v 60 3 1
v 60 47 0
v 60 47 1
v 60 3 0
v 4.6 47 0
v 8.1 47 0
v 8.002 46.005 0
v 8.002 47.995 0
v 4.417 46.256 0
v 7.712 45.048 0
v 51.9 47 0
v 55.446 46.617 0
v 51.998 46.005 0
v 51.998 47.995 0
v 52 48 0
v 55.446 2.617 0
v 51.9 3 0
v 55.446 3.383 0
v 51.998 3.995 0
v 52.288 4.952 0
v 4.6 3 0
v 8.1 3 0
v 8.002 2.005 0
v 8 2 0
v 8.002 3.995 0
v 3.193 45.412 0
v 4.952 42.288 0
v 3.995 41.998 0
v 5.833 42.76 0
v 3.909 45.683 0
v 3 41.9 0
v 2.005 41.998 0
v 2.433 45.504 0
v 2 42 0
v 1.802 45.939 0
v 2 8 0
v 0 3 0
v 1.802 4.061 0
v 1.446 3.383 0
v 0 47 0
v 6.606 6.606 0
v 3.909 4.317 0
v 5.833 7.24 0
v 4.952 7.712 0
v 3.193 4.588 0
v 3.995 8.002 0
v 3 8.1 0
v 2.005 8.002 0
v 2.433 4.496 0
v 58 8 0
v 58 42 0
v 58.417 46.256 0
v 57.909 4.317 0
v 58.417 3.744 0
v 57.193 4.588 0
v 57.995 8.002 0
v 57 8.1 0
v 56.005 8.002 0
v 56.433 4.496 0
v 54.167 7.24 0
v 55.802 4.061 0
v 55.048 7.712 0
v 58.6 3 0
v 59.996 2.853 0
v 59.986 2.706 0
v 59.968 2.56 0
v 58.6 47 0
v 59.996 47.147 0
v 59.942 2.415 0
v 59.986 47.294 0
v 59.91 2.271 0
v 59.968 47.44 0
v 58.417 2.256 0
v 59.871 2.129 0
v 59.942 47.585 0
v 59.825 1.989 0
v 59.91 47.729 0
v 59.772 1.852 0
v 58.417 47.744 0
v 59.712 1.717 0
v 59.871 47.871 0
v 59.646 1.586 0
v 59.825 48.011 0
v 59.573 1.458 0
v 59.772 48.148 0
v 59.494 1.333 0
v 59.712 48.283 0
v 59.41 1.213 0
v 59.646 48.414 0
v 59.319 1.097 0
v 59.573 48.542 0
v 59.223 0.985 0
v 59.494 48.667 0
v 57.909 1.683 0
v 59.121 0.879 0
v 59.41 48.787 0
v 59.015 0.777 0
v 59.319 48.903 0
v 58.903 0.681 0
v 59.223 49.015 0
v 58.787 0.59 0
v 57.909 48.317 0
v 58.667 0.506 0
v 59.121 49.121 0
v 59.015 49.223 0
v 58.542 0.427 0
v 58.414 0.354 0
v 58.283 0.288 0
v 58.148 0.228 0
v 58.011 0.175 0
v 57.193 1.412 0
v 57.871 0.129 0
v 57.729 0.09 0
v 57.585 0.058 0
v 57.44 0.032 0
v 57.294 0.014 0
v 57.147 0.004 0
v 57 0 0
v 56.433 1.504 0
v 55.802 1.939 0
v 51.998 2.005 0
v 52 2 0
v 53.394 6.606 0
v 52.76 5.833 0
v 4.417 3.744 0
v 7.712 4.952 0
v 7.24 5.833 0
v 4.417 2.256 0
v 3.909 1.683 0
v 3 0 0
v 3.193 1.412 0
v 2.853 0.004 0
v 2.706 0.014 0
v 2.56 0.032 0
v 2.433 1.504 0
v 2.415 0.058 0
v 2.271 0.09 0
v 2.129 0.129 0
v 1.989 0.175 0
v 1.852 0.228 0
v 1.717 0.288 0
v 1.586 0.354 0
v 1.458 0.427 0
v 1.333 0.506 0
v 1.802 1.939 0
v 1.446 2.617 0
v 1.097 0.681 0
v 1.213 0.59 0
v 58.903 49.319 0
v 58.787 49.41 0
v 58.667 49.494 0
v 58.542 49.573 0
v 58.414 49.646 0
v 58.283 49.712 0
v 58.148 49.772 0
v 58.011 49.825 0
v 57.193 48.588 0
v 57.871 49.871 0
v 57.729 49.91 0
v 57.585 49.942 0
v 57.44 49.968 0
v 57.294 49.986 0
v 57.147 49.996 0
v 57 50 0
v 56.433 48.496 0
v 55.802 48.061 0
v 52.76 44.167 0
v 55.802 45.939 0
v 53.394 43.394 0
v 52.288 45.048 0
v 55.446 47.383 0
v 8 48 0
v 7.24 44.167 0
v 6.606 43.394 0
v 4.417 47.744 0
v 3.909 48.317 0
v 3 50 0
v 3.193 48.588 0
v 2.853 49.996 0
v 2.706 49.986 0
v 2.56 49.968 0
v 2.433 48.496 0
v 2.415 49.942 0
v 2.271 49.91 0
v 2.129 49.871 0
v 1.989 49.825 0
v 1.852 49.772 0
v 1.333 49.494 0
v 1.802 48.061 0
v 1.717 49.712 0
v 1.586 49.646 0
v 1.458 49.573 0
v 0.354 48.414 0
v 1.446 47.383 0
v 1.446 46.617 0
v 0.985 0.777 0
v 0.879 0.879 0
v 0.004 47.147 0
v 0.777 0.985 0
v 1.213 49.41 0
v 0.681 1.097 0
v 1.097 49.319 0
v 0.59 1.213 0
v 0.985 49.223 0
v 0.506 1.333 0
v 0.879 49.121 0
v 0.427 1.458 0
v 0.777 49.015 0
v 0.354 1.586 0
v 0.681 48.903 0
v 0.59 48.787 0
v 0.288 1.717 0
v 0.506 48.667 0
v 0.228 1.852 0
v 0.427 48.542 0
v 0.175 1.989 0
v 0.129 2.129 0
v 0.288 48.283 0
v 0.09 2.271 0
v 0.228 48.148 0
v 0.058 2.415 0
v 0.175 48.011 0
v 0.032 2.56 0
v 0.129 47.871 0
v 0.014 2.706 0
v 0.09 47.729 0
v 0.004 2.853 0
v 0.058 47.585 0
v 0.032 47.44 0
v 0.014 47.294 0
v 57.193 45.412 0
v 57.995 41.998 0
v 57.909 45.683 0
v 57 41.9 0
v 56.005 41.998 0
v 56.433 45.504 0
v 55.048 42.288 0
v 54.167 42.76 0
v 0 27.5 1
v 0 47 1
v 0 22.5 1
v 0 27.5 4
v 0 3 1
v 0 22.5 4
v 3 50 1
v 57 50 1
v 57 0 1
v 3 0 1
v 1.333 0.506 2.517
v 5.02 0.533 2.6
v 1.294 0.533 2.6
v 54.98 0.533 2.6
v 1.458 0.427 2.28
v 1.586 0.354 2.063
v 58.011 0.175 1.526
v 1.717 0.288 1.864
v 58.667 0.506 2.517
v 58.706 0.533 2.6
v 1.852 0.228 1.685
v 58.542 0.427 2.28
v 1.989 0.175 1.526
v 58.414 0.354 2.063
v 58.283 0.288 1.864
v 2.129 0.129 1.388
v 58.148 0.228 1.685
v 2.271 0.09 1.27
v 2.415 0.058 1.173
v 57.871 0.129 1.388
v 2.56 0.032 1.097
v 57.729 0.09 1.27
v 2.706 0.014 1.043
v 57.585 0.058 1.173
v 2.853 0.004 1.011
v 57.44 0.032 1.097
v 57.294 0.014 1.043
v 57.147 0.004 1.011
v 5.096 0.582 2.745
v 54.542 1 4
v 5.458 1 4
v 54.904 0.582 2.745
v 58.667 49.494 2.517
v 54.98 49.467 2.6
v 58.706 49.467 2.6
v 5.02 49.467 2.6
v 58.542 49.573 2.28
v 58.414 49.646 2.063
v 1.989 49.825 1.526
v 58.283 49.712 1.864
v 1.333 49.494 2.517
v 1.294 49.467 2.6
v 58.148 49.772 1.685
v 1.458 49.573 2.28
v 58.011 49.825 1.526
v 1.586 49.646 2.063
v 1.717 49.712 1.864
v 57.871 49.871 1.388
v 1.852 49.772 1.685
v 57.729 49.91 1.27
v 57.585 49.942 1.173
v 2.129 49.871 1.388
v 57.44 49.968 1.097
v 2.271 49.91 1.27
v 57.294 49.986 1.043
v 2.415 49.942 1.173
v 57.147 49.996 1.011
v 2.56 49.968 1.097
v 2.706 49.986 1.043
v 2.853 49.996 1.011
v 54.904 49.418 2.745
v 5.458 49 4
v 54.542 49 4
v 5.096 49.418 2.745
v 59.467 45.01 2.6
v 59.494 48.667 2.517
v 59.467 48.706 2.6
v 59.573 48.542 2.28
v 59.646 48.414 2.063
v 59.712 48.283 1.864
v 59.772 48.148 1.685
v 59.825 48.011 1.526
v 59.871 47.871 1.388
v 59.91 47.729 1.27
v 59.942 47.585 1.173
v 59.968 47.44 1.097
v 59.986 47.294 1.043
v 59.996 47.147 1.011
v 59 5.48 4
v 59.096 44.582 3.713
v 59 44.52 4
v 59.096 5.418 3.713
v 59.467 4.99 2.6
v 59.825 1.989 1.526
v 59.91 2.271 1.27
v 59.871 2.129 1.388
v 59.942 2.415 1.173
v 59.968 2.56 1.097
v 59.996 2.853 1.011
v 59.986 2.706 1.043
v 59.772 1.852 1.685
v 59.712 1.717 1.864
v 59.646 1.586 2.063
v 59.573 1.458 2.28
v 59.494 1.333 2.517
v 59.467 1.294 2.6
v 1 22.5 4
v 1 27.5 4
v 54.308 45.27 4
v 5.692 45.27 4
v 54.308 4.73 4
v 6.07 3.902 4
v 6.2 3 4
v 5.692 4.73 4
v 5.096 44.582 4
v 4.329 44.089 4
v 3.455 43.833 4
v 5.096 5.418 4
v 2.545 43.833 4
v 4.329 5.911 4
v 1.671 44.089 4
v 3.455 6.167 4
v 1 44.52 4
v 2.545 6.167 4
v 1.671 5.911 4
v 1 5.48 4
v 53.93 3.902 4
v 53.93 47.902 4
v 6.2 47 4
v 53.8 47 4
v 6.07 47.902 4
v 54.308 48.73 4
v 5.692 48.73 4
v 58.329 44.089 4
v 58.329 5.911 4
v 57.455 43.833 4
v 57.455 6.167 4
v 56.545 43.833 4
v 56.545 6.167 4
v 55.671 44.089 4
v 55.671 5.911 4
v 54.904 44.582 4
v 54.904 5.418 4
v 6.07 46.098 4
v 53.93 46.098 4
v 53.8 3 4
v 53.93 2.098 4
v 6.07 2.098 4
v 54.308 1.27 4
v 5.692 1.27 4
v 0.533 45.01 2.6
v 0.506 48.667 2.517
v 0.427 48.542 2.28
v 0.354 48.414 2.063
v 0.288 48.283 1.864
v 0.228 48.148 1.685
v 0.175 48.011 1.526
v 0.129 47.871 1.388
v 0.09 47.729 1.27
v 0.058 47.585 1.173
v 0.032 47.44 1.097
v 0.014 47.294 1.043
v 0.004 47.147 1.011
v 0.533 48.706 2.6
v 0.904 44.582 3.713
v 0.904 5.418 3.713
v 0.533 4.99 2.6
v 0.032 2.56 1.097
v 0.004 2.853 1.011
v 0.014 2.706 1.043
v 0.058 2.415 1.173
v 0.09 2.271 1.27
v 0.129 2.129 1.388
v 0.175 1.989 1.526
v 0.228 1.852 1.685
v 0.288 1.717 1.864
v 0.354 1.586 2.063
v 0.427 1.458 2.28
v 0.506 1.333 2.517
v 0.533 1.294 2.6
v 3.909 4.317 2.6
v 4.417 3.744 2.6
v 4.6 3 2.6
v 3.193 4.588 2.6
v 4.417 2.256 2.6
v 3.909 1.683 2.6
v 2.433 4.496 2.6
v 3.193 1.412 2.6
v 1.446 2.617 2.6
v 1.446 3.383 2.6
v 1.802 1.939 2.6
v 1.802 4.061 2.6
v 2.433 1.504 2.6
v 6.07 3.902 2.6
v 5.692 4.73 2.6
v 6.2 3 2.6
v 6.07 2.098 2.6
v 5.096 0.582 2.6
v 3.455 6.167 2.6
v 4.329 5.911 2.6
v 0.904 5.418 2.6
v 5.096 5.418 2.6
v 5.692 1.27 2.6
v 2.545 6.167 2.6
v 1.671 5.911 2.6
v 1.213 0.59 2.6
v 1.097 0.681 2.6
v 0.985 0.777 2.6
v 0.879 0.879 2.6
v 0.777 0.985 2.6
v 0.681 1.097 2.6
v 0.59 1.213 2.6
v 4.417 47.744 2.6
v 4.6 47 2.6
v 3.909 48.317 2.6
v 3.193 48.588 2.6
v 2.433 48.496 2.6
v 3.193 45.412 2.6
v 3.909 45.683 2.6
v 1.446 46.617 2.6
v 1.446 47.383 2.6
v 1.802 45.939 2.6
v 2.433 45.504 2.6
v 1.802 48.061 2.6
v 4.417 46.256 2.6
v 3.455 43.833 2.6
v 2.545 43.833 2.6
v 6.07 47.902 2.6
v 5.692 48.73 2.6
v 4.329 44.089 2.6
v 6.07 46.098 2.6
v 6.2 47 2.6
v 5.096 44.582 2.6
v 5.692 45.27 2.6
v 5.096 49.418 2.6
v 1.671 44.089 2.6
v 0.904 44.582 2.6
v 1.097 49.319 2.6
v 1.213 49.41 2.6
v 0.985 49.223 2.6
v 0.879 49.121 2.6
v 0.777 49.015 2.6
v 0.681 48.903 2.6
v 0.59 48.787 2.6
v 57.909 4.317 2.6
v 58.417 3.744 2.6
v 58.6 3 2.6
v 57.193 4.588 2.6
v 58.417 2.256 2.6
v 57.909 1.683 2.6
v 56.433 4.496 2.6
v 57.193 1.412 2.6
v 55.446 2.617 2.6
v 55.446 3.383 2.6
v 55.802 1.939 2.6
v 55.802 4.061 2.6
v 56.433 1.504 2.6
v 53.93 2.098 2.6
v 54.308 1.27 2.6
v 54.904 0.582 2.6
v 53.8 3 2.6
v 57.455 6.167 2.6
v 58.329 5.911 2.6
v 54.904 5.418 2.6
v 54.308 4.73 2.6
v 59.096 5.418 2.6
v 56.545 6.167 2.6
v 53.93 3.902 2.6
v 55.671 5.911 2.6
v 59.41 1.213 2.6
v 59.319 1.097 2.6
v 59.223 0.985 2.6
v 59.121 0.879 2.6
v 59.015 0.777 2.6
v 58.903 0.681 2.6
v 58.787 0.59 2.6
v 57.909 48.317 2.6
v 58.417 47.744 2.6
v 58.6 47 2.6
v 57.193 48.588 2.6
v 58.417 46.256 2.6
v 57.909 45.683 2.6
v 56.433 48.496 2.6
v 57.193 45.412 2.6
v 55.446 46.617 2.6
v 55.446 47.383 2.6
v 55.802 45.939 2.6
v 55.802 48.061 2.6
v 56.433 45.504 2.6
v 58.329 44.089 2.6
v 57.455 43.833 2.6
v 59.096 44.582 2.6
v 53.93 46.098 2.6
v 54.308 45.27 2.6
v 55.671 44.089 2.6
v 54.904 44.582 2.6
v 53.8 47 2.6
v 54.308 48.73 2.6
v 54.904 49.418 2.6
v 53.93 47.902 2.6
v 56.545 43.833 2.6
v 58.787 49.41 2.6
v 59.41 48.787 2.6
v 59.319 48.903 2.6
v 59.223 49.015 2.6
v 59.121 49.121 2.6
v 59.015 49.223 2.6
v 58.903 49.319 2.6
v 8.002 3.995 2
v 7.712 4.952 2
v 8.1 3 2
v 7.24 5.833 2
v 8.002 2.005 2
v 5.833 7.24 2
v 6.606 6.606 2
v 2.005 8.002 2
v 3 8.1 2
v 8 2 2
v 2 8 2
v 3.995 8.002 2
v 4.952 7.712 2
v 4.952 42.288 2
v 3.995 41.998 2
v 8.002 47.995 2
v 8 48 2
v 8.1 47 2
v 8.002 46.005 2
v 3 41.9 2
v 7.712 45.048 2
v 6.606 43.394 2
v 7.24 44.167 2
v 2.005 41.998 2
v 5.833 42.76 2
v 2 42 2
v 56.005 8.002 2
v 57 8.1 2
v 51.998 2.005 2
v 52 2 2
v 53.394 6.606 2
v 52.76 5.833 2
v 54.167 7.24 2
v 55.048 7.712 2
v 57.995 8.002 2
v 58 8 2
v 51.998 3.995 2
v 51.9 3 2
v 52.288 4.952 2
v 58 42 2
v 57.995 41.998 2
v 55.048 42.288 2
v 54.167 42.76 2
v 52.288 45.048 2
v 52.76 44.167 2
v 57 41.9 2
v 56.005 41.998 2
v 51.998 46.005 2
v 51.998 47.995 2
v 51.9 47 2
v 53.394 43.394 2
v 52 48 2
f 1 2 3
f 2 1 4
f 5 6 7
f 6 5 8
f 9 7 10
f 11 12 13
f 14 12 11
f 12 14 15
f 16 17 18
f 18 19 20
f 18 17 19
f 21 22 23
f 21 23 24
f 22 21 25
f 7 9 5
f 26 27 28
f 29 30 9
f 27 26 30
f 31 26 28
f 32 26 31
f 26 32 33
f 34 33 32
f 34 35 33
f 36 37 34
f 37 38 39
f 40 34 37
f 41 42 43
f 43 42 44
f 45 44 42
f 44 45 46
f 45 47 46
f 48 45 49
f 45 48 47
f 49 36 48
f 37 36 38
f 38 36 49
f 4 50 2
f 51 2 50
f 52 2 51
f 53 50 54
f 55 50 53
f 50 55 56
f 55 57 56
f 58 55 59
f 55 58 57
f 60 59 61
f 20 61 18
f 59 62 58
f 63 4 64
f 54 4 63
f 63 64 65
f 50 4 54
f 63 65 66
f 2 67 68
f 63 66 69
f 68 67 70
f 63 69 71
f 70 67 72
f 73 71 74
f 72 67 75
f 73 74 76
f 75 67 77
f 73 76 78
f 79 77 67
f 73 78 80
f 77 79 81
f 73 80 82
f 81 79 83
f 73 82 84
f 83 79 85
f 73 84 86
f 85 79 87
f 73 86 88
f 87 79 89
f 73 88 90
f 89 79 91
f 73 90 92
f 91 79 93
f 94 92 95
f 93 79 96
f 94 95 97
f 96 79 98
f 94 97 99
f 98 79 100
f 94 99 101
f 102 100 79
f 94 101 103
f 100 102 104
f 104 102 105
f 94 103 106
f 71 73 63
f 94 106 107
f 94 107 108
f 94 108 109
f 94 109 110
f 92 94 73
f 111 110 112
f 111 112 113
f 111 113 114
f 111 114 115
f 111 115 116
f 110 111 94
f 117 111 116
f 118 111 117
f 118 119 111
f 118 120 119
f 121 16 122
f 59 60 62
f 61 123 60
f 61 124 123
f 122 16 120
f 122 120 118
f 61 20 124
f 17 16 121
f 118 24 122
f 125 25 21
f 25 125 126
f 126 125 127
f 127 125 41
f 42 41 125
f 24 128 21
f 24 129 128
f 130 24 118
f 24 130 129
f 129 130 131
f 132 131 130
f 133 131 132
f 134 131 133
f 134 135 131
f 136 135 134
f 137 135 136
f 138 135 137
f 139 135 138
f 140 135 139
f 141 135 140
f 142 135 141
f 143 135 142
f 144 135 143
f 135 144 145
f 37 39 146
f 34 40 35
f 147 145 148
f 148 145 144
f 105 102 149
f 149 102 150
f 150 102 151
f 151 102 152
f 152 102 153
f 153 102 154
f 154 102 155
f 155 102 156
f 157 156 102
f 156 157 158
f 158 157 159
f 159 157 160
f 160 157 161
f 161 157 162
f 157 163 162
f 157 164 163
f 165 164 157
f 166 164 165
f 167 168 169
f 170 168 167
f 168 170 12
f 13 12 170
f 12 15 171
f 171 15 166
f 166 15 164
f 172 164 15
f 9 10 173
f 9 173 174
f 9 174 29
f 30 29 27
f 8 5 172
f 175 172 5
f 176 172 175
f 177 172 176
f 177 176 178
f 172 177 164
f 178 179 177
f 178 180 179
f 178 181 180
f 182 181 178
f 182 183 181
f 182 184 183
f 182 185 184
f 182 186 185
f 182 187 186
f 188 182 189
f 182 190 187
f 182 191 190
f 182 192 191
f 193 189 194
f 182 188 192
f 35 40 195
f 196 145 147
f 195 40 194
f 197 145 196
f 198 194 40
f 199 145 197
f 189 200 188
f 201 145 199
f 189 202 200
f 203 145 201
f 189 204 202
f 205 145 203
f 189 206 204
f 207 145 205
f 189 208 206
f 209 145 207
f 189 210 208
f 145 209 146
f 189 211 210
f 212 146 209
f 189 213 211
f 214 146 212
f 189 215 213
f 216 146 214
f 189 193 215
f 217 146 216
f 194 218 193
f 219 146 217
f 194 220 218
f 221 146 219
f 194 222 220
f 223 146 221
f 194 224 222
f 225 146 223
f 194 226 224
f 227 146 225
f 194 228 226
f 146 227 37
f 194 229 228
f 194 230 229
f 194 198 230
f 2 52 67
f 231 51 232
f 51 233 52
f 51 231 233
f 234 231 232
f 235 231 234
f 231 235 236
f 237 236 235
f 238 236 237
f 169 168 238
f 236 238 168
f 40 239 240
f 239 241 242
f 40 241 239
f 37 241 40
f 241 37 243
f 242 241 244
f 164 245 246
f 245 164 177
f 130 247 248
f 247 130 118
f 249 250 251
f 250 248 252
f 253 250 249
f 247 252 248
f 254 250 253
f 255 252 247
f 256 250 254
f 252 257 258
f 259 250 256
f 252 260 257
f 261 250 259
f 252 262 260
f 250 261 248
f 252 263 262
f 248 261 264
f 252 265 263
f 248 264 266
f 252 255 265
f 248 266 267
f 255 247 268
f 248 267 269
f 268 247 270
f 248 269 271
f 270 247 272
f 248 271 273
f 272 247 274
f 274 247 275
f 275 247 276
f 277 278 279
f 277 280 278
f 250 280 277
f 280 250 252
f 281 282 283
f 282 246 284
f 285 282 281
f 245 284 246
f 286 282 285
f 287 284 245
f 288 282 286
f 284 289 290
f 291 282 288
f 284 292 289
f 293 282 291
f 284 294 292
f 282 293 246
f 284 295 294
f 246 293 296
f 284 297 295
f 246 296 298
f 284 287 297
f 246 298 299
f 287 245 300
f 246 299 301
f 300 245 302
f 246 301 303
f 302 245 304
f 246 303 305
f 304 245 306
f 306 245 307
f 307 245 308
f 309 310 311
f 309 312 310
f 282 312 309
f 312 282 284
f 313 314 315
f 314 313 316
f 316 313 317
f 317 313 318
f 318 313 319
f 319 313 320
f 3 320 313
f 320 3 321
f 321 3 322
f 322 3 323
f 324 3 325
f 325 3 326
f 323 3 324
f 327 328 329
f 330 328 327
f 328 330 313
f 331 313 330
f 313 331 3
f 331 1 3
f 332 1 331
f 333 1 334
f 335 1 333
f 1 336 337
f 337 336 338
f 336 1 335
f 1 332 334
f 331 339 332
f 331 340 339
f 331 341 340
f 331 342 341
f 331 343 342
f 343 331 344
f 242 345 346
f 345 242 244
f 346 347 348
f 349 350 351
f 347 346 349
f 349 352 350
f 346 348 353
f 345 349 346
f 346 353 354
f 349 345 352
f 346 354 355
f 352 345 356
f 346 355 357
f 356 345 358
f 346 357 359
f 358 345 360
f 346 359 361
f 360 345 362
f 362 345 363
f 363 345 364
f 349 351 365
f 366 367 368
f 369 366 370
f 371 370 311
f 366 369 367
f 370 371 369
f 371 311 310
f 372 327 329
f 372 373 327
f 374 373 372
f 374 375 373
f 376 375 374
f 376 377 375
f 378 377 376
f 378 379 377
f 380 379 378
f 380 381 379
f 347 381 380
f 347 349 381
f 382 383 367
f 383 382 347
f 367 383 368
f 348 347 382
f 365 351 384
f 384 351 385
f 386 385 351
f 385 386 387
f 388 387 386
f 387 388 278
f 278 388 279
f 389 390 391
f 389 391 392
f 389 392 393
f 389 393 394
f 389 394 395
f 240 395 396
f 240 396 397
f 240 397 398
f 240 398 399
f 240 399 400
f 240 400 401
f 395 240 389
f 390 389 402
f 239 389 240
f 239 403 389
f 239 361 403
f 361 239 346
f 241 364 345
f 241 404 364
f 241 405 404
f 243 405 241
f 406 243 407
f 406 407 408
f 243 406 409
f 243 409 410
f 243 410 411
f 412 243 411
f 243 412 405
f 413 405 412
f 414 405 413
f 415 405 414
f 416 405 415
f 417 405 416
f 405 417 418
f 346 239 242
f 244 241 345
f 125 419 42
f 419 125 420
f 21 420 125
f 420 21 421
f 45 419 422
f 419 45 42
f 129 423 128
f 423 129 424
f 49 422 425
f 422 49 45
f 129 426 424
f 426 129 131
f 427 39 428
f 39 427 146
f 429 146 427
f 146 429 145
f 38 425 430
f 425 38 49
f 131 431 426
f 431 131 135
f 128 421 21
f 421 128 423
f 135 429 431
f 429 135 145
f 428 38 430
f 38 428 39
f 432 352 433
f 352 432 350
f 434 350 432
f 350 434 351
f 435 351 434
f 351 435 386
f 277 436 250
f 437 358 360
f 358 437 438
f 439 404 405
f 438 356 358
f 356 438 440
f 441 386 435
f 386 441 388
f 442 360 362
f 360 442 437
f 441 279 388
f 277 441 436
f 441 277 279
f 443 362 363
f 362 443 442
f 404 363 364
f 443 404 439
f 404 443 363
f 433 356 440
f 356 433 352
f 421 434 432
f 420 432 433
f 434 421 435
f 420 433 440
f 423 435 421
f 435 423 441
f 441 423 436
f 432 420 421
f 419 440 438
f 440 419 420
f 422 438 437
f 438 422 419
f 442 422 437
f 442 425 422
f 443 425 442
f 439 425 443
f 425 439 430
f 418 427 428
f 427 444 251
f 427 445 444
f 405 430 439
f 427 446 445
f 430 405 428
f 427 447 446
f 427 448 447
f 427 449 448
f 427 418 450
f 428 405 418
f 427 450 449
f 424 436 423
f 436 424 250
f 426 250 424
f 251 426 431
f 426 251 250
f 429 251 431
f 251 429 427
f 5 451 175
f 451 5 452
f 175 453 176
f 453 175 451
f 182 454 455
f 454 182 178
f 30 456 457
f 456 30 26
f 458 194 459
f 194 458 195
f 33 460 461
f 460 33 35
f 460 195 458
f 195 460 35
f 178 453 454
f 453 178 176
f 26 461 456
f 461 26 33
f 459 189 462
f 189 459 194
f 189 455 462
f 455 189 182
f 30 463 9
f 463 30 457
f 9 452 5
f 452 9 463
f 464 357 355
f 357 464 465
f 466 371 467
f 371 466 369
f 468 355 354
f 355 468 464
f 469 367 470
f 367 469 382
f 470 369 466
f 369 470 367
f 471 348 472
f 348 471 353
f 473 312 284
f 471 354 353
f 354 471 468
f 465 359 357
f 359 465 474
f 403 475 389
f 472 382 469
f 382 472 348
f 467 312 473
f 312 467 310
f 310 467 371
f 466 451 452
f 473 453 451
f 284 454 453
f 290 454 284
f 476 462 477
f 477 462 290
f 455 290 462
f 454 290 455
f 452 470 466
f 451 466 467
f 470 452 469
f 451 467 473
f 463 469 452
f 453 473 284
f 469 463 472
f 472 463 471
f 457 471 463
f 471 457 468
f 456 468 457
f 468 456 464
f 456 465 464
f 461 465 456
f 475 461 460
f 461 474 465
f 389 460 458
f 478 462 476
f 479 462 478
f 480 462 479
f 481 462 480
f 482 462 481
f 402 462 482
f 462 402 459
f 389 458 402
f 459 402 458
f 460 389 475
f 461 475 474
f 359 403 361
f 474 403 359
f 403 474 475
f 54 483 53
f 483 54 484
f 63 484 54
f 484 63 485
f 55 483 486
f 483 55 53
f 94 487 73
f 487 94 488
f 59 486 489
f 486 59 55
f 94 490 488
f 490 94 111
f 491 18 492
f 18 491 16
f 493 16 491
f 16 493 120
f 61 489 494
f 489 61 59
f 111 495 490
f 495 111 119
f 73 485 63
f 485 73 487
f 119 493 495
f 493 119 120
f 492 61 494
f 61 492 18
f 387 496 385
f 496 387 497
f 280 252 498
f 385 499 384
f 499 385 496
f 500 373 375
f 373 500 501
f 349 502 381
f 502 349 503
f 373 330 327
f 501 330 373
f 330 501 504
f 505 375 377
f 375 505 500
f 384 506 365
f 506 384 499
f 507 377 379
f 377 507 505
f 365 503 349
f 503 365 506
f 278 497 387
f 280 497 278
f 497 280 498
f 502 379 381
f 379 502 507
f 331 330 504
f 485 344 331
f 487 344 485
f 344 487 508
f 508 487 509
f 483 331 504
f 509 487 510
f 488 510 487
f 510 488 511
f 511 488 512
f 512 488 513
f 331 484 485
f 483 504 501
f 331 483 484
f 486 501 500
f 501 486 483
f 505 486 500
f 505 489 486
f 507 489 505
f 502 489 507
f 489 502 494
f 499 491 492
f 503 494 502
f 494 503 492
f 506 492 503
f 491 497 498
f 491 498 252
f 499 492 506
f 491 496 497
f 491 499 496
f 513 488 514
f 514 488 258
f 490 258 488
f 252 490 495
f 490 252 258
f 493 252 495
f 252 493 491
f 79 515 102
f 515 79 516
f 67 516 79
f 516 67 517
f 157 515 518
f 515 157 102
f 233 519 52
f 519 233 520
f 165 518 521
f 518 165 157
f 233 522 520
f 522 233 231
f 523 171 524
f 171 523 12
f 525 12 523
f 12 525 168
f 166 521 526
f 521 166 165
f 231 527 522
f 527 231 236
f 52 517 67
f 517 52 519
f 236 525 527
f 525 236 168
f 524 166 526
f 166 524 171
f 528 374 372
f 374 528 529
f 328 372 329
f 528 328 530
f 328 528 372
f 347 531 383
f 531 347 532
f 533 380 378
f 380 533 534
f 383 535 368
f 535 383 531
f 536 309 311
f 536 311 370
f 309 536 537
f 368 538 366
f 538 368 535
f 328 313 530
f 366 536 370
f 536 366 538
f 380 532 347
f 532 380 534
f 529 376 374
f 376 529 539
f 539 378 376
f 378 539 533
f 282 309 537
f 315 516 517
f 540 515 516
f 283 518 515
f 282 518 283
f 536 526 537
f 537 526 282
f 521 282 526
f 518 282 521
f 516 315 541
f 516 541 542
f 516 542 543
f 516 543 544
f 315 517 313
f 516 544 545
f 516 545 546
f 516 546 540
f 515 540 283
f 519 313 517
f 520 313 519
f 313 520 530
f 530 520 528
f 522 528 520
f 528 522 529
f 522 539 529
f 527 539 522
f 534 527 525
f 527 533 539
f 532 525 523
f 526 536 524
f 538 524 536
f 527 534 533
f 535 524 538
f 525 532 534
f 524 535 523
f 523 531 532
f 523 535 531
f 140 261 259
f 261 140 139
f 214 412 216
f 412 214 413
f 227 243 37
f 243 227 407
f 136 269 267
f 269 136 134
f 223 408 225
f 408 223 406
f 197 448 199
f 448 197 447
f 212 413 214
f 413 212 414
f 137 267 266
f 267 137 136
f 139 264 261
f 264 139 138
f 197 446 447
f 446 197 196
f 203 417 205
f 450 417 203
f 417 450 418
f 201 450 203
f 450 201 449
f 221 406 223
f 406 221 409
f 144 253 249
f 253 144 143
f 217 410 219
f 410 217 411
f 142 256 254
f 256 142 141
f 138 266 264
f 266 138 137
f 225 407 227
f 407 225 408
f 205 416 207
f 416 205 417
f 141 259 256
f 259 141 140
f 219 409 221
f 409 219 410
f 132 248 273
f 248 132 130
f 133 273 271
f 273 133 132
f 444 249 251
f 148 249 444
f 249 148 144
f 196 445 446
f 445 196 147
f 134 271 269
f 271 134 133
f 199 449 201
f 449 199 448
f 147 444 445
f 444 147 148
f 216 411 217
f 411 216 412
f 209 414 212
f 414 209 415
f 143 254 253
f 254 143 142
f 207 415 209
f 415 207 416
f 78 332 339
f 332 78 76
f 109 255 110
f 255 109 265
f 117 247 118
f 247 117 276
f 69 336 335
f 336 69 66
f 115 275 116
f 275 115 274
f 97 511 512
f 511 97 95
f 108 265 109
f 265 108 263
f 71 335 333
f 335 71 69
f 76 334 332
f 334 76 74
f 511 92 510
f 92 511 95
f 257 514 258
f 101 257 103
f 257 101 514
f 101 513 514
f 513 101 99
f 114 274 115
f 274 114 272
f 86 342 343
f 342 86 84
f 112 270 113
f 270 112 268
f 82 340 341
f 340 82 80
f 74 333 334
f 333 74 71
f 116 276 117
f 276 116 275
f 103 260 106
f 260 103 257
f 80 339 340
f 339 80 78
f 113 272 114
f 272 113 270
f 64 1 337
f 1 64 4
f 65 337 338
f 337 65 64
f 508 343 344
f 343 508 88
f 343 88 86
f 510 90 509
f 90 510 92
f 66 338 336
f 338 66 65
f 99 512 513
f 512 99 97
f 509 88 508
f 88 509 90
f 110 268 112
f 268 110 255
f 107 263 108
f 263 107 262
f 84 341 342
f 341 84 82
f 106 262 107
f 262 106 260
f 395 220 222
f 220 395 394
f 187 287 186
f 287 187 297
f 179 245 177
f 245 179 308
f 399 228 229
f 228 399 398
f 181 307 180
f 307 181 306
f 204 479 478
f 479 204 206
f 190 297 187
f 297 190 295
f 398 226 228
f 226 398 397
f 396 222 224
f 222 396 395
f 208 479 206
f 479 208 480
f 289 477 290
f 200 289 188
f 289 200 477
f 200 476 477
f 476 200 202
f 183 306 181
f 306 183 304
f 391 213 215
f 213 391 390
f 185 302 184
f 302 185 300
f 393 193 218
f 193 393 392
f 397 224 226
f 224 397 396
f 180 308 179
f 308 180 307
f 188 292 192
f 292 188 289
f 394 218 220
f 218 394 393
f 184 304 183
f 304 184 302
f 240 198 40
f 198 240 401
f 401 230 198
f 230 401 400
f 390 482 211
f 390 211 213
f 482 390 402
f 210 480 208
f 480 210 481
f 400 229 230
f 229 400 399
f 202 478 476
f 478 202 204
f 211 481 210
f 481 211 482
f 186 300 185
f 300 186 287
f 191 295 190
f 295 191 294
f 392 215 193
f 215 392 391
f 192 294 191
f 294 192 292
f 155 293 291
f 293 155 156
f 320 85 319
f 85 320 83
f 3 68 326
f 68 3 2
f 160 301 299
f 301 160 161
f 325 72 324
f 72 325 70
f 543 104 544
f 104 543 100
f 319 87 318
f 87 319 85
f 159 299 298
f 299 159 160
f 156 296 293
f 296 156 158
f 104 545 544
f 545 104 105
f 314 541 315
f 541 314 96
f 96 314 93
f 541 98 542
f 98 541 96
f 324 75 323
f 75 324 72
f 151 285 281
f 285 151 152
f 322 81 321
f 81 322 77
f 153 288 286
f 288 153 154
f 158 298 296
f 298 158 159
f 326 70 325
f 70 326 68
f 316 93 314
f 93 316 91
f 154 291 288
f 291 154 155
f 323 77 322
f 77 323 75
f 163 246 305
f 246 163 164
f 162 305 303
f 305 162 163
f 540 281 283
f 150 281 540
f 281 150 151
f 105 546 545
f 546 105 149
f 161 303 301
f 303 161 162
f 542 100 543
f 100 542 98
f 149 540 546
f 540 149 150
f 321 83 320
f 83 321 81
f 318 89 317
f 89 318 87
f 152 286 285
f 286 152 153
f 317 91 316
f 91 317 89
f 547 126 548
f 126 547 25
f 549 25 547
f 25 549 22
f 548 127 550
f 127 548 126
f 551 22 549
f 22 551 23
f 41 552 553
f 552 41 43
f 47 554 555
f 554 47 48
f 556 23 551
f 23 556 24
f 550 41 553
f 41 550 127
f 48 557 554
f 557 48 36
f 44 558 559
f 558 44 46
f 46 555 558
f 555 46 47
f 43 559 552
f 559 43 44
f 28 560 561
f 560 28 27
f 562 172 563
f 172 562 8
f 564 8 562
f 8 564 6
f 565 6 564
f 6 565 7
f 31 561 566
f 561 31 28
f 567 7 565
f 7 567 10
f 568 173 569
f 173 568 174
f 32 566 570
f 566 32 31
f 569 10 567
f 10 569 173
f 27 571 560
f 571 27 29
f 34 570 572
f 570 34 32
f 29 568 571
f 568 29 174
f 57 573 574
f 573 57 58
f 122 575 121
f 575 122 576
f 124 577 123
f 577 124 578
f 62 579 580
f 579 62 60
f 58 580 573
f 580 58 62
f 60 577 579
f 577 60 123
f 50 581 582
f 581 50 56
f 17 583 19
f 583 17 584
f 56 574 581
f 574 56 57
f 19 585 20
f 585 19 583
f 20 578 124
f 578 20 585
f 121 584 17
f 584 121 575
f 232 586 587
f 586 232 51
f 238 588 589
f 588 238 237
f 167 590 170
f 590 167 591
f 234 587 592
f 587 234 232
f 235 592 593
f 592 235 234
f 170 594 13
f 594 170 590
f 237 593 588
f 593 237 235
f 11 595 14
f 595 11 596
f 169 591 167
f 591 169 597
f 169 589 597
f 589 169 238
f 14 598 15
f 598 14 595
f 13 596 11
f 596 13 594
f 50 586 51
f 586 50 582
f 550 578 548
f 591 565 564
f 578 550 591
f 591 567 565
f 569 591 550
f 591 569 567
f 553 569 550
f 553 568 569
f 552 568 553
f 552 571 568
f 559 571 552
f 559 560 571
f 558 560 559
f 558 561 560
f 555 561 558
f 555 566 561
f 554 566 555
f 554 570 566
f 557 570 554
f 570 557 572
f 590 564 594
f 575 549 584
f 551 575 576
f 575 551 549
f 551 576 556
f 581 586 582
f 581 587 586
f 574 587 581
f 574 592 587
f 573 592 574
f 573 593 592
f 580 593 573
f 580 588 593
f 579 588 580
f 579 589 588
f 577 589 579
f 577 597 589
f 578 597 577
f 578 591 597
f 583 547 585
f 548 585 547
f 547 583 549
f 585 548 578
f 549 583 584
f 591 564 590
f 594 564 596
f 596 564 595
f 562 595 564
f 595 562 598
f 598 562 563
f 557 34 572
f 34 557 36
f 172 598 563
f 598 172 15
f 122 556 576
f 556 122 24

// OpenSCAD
// file: ../lib/utils.scad
module clearance_hole(d, h=100, clearance=0.2, e=0.1) {
	cylinder(r=(d+clearance)/2, h=h+e, $fn=min(64, 4 + 3*d));
}

module z_fillet(r=5, h=100, e=0.1) {
	difference() {
	translate([0-e, 0-e, 0])
		cube([r+e, r+e, h]);
	translate([r, r, 0-e])
		cylinder(r=r, h=h+e+e, $fn=$fn*4);
	}
}

module hexagonal_prism(d_flat=8, h=10) {
    r = d_flat / sqrt(3); // Circumradius
    cylinder(h=h, r=r, $fn=6);
}

module grip_texture(length, depth, height) {
	n = floor(length/depth); // TODO: number of teeth
	e = 0.1;
	xOffset = (length - depth*n)/2;
	difference() {
		translate([0, 0-e, 0-e])
		cube([length, depth+e, height+e+e]);
		for (i = [0:n]) {
			translate([i*depth*2 - xOffset, depth, 0-e])
			cylinder(r=depth, h=height+e+e, $fn=4);
		}
	}
}

module lanyard_loop(length=30, width=8, height=10, overflow=0, slotDiameter=5) {
	e=0.1;
	wall = (height - slotDiameter)/2;
	assert(wall > 0, "slotDiameter too large for lanyard loop");
	difference() {
		union() {
			translate([0-overflow, 0, 0])
			cube([height+overflow, length, width]);
			translate([0, length, 0])
				z_fillet(height/2, h=width);
		}
		translate([height, 0, 0-e])
		rotate([0, 0, 90])
		z_fillet(height/2);
		translate([height, length, 0-e])
		rotate([0, 0, 180])
		z_fillet(height/2);

		// slot
		slotLength = length - wall*3 - slotDiameter;
		translate([wall, wall, 0-e])
			round_rect(size=[slotDiameter, slotLength, width+e+e], r=slotDiameter/2);
		translate([height/2, length - slotDiameter/2 - wall, 0-e])
		cylinder(r=slotDiameter/2, h=width+e+e);
	}
}

module round_rect(size=[10, 10, 10], r=1) {
	difference() {
		cube(size);
		if (r > 0) {
			for (i = [[0,0,0], [1,0,90], [1,1,180], [0,1,270]]) {
				translate([i[0]*size[0], i[1]*size[1], -.1])
				rotate([0, 0, i[2]])
					z_fillet(r, h=size[2]+0.2);
			}
		}
	}
}

function mounting_bolts(length, width, holeOffset) = [
	[ holeOffset, holeOffset],
	[ holeOffset, width - holeOffset],
	[ length - holeOffset, holeOffset],
	[ length - holeOffset, width - holeOffset]
];

function hexWrenchSize(width) = width / 2 * sqrt(3);
// file: ../cover.scad
use <lib/utils.scad>;

module case_cover(
	length=47,
	width=50,
	thickness=4,
	hex=false,
	counterboreDepth=3,
	counterboreDiameter=8) {

	bottomThickness = 1;
	topThickness = 2;
	mountHoleOffset = 3; // must match the value in case_frame
	mountHoleSize = 3;
	draftOffset = 1;
	wallThickness = 2;
	wrenchSize = hexWrenchSize(counterboreDiameter);
	echo("Counterbore size: ", counterboreDiameter, "\n");
	echo("Wrench size: ", wrenchSize, "\n");
	e = 0.1; // small waste number; not for final geometry

	assert(thickness >= (counterboreDepth+bottomThickness), "case_cover thickness is too small");

	difference() {
		union() {
			cube([
				length,
				width,
				bottomThickness
			]);
			translate([0, 0, bottomThickness])
				truncated_pyramid(length=length, width=width, height=thickness-bottomThickness, inset=draftOffset);

			// Feet - for stability
			footWidth = 5;
			translate([0, (width - footWidth)/2, 0])
				cube([ length/2, footWidth, thickness]);

		}

		for (
			position = mounting_bolts(length, width, mountHoleOffset)
		) {
			translate([position[0], position[1], 0]) {
				clearance_hole(mountHoleSize);
				translate([0,0, thickness - counterboreDepth])
				if (hex) {
					cylinder(r=wrenchSize/2, h=counterboreDepth+e+e, $fn=6);
				} else {
					clearance_hole(counterboreDiameter, counterboreDepth+e);
				}
			}
		}
		if (hex) { // remove extra material in corners if hex is used
			positions = mounting_bolts(length, width, mountHoleOffset);
			zOffset = thickness - counterboreDepth;
			xCornerOffset = 0 + counterboreDiameter/6 + mountHoleOffset - counterboreDiameter/2;
			yCornerOffset = 0;
			// bottom left
			translate([0, 0, zOffset])
			cube([positions[0][0] + xCornerOffset, positions[0][1]+yCornerOffset, thickness]);
			// TODO: remove material to the corners of the hex
		}
		// Corner Radiuses
		translate([0, 0, 0-e])          rotate([0, 0, 0])    z_fillet(3);
		translate([length, 0, 0-e])     rotate([0, 0, 90])   z_fillet(3);
		translate([0, width, 0-e])      rotate([0, 0, 270])  z_fillet(3);
		translate([length, width, 0-e]) rotate([0, 0, 180])  z_fillet(3);

		// Inner cavity
		difference() {
			translate([
				wallThickness,
				wallThickness,
				0-e
			])
			cube([
				length - 2*wallThickness,
				width - 2*wallThickness,
				thickness - topThickness + e
			]);

			for (position = mounting_bolts(length, width, mountHoleOffset)) {
				translate([position[0], position[1], 0-e]) {
					innerCavityRadius = max((counterboreDiameter/2)+topThickness,wallThickness);
					cylinder(r=innerCavityRadius, h=thickness-topThickness+e+e);
				}
			}
		}
	}

}

module truncated_pyramid(length, width, height, inset=5) {
	polyhedron(
		points=[
			[0      , 0     , 0]      , // 0
			[length , 0     , 0]      , // 1
			[length , width , 0]      , // 2
			[0      , width , 0]      , // 3

			[inset        , inset       , height] , // 4
			[length-inset , inset       , height] , // 5
			[length-inset , width-inset , height] , // 6
			[inset        , width-inset , height] , // 7
		],
		faces=[
			[1, 0, 4],
			[4, 5, 1],
			[2, 1, 5],
			[5, 6, 2],
			[3, 2, 6],
			[6, 7, 3],
			[0, 3, 7],
			[7, 4, 0],
			[7, 6, 5],
			[4, 7, 5],
			[0, 1, 3],
			[1, 2, 3],
		],
		convexity=1
	);
}

case_cover($fn=32);
// main file
use <../cover.scad>;

width=50;
length=60;
thickness=4;
fastenerThickness=2.6; // thickness at the fasteners

case_cover(
	length=length,
	width=width,
	hex=false,
	counterboreDepth=(thickness-fastenerThickness),
	counterboreDiameter=6.2,
	$fn=32
);
